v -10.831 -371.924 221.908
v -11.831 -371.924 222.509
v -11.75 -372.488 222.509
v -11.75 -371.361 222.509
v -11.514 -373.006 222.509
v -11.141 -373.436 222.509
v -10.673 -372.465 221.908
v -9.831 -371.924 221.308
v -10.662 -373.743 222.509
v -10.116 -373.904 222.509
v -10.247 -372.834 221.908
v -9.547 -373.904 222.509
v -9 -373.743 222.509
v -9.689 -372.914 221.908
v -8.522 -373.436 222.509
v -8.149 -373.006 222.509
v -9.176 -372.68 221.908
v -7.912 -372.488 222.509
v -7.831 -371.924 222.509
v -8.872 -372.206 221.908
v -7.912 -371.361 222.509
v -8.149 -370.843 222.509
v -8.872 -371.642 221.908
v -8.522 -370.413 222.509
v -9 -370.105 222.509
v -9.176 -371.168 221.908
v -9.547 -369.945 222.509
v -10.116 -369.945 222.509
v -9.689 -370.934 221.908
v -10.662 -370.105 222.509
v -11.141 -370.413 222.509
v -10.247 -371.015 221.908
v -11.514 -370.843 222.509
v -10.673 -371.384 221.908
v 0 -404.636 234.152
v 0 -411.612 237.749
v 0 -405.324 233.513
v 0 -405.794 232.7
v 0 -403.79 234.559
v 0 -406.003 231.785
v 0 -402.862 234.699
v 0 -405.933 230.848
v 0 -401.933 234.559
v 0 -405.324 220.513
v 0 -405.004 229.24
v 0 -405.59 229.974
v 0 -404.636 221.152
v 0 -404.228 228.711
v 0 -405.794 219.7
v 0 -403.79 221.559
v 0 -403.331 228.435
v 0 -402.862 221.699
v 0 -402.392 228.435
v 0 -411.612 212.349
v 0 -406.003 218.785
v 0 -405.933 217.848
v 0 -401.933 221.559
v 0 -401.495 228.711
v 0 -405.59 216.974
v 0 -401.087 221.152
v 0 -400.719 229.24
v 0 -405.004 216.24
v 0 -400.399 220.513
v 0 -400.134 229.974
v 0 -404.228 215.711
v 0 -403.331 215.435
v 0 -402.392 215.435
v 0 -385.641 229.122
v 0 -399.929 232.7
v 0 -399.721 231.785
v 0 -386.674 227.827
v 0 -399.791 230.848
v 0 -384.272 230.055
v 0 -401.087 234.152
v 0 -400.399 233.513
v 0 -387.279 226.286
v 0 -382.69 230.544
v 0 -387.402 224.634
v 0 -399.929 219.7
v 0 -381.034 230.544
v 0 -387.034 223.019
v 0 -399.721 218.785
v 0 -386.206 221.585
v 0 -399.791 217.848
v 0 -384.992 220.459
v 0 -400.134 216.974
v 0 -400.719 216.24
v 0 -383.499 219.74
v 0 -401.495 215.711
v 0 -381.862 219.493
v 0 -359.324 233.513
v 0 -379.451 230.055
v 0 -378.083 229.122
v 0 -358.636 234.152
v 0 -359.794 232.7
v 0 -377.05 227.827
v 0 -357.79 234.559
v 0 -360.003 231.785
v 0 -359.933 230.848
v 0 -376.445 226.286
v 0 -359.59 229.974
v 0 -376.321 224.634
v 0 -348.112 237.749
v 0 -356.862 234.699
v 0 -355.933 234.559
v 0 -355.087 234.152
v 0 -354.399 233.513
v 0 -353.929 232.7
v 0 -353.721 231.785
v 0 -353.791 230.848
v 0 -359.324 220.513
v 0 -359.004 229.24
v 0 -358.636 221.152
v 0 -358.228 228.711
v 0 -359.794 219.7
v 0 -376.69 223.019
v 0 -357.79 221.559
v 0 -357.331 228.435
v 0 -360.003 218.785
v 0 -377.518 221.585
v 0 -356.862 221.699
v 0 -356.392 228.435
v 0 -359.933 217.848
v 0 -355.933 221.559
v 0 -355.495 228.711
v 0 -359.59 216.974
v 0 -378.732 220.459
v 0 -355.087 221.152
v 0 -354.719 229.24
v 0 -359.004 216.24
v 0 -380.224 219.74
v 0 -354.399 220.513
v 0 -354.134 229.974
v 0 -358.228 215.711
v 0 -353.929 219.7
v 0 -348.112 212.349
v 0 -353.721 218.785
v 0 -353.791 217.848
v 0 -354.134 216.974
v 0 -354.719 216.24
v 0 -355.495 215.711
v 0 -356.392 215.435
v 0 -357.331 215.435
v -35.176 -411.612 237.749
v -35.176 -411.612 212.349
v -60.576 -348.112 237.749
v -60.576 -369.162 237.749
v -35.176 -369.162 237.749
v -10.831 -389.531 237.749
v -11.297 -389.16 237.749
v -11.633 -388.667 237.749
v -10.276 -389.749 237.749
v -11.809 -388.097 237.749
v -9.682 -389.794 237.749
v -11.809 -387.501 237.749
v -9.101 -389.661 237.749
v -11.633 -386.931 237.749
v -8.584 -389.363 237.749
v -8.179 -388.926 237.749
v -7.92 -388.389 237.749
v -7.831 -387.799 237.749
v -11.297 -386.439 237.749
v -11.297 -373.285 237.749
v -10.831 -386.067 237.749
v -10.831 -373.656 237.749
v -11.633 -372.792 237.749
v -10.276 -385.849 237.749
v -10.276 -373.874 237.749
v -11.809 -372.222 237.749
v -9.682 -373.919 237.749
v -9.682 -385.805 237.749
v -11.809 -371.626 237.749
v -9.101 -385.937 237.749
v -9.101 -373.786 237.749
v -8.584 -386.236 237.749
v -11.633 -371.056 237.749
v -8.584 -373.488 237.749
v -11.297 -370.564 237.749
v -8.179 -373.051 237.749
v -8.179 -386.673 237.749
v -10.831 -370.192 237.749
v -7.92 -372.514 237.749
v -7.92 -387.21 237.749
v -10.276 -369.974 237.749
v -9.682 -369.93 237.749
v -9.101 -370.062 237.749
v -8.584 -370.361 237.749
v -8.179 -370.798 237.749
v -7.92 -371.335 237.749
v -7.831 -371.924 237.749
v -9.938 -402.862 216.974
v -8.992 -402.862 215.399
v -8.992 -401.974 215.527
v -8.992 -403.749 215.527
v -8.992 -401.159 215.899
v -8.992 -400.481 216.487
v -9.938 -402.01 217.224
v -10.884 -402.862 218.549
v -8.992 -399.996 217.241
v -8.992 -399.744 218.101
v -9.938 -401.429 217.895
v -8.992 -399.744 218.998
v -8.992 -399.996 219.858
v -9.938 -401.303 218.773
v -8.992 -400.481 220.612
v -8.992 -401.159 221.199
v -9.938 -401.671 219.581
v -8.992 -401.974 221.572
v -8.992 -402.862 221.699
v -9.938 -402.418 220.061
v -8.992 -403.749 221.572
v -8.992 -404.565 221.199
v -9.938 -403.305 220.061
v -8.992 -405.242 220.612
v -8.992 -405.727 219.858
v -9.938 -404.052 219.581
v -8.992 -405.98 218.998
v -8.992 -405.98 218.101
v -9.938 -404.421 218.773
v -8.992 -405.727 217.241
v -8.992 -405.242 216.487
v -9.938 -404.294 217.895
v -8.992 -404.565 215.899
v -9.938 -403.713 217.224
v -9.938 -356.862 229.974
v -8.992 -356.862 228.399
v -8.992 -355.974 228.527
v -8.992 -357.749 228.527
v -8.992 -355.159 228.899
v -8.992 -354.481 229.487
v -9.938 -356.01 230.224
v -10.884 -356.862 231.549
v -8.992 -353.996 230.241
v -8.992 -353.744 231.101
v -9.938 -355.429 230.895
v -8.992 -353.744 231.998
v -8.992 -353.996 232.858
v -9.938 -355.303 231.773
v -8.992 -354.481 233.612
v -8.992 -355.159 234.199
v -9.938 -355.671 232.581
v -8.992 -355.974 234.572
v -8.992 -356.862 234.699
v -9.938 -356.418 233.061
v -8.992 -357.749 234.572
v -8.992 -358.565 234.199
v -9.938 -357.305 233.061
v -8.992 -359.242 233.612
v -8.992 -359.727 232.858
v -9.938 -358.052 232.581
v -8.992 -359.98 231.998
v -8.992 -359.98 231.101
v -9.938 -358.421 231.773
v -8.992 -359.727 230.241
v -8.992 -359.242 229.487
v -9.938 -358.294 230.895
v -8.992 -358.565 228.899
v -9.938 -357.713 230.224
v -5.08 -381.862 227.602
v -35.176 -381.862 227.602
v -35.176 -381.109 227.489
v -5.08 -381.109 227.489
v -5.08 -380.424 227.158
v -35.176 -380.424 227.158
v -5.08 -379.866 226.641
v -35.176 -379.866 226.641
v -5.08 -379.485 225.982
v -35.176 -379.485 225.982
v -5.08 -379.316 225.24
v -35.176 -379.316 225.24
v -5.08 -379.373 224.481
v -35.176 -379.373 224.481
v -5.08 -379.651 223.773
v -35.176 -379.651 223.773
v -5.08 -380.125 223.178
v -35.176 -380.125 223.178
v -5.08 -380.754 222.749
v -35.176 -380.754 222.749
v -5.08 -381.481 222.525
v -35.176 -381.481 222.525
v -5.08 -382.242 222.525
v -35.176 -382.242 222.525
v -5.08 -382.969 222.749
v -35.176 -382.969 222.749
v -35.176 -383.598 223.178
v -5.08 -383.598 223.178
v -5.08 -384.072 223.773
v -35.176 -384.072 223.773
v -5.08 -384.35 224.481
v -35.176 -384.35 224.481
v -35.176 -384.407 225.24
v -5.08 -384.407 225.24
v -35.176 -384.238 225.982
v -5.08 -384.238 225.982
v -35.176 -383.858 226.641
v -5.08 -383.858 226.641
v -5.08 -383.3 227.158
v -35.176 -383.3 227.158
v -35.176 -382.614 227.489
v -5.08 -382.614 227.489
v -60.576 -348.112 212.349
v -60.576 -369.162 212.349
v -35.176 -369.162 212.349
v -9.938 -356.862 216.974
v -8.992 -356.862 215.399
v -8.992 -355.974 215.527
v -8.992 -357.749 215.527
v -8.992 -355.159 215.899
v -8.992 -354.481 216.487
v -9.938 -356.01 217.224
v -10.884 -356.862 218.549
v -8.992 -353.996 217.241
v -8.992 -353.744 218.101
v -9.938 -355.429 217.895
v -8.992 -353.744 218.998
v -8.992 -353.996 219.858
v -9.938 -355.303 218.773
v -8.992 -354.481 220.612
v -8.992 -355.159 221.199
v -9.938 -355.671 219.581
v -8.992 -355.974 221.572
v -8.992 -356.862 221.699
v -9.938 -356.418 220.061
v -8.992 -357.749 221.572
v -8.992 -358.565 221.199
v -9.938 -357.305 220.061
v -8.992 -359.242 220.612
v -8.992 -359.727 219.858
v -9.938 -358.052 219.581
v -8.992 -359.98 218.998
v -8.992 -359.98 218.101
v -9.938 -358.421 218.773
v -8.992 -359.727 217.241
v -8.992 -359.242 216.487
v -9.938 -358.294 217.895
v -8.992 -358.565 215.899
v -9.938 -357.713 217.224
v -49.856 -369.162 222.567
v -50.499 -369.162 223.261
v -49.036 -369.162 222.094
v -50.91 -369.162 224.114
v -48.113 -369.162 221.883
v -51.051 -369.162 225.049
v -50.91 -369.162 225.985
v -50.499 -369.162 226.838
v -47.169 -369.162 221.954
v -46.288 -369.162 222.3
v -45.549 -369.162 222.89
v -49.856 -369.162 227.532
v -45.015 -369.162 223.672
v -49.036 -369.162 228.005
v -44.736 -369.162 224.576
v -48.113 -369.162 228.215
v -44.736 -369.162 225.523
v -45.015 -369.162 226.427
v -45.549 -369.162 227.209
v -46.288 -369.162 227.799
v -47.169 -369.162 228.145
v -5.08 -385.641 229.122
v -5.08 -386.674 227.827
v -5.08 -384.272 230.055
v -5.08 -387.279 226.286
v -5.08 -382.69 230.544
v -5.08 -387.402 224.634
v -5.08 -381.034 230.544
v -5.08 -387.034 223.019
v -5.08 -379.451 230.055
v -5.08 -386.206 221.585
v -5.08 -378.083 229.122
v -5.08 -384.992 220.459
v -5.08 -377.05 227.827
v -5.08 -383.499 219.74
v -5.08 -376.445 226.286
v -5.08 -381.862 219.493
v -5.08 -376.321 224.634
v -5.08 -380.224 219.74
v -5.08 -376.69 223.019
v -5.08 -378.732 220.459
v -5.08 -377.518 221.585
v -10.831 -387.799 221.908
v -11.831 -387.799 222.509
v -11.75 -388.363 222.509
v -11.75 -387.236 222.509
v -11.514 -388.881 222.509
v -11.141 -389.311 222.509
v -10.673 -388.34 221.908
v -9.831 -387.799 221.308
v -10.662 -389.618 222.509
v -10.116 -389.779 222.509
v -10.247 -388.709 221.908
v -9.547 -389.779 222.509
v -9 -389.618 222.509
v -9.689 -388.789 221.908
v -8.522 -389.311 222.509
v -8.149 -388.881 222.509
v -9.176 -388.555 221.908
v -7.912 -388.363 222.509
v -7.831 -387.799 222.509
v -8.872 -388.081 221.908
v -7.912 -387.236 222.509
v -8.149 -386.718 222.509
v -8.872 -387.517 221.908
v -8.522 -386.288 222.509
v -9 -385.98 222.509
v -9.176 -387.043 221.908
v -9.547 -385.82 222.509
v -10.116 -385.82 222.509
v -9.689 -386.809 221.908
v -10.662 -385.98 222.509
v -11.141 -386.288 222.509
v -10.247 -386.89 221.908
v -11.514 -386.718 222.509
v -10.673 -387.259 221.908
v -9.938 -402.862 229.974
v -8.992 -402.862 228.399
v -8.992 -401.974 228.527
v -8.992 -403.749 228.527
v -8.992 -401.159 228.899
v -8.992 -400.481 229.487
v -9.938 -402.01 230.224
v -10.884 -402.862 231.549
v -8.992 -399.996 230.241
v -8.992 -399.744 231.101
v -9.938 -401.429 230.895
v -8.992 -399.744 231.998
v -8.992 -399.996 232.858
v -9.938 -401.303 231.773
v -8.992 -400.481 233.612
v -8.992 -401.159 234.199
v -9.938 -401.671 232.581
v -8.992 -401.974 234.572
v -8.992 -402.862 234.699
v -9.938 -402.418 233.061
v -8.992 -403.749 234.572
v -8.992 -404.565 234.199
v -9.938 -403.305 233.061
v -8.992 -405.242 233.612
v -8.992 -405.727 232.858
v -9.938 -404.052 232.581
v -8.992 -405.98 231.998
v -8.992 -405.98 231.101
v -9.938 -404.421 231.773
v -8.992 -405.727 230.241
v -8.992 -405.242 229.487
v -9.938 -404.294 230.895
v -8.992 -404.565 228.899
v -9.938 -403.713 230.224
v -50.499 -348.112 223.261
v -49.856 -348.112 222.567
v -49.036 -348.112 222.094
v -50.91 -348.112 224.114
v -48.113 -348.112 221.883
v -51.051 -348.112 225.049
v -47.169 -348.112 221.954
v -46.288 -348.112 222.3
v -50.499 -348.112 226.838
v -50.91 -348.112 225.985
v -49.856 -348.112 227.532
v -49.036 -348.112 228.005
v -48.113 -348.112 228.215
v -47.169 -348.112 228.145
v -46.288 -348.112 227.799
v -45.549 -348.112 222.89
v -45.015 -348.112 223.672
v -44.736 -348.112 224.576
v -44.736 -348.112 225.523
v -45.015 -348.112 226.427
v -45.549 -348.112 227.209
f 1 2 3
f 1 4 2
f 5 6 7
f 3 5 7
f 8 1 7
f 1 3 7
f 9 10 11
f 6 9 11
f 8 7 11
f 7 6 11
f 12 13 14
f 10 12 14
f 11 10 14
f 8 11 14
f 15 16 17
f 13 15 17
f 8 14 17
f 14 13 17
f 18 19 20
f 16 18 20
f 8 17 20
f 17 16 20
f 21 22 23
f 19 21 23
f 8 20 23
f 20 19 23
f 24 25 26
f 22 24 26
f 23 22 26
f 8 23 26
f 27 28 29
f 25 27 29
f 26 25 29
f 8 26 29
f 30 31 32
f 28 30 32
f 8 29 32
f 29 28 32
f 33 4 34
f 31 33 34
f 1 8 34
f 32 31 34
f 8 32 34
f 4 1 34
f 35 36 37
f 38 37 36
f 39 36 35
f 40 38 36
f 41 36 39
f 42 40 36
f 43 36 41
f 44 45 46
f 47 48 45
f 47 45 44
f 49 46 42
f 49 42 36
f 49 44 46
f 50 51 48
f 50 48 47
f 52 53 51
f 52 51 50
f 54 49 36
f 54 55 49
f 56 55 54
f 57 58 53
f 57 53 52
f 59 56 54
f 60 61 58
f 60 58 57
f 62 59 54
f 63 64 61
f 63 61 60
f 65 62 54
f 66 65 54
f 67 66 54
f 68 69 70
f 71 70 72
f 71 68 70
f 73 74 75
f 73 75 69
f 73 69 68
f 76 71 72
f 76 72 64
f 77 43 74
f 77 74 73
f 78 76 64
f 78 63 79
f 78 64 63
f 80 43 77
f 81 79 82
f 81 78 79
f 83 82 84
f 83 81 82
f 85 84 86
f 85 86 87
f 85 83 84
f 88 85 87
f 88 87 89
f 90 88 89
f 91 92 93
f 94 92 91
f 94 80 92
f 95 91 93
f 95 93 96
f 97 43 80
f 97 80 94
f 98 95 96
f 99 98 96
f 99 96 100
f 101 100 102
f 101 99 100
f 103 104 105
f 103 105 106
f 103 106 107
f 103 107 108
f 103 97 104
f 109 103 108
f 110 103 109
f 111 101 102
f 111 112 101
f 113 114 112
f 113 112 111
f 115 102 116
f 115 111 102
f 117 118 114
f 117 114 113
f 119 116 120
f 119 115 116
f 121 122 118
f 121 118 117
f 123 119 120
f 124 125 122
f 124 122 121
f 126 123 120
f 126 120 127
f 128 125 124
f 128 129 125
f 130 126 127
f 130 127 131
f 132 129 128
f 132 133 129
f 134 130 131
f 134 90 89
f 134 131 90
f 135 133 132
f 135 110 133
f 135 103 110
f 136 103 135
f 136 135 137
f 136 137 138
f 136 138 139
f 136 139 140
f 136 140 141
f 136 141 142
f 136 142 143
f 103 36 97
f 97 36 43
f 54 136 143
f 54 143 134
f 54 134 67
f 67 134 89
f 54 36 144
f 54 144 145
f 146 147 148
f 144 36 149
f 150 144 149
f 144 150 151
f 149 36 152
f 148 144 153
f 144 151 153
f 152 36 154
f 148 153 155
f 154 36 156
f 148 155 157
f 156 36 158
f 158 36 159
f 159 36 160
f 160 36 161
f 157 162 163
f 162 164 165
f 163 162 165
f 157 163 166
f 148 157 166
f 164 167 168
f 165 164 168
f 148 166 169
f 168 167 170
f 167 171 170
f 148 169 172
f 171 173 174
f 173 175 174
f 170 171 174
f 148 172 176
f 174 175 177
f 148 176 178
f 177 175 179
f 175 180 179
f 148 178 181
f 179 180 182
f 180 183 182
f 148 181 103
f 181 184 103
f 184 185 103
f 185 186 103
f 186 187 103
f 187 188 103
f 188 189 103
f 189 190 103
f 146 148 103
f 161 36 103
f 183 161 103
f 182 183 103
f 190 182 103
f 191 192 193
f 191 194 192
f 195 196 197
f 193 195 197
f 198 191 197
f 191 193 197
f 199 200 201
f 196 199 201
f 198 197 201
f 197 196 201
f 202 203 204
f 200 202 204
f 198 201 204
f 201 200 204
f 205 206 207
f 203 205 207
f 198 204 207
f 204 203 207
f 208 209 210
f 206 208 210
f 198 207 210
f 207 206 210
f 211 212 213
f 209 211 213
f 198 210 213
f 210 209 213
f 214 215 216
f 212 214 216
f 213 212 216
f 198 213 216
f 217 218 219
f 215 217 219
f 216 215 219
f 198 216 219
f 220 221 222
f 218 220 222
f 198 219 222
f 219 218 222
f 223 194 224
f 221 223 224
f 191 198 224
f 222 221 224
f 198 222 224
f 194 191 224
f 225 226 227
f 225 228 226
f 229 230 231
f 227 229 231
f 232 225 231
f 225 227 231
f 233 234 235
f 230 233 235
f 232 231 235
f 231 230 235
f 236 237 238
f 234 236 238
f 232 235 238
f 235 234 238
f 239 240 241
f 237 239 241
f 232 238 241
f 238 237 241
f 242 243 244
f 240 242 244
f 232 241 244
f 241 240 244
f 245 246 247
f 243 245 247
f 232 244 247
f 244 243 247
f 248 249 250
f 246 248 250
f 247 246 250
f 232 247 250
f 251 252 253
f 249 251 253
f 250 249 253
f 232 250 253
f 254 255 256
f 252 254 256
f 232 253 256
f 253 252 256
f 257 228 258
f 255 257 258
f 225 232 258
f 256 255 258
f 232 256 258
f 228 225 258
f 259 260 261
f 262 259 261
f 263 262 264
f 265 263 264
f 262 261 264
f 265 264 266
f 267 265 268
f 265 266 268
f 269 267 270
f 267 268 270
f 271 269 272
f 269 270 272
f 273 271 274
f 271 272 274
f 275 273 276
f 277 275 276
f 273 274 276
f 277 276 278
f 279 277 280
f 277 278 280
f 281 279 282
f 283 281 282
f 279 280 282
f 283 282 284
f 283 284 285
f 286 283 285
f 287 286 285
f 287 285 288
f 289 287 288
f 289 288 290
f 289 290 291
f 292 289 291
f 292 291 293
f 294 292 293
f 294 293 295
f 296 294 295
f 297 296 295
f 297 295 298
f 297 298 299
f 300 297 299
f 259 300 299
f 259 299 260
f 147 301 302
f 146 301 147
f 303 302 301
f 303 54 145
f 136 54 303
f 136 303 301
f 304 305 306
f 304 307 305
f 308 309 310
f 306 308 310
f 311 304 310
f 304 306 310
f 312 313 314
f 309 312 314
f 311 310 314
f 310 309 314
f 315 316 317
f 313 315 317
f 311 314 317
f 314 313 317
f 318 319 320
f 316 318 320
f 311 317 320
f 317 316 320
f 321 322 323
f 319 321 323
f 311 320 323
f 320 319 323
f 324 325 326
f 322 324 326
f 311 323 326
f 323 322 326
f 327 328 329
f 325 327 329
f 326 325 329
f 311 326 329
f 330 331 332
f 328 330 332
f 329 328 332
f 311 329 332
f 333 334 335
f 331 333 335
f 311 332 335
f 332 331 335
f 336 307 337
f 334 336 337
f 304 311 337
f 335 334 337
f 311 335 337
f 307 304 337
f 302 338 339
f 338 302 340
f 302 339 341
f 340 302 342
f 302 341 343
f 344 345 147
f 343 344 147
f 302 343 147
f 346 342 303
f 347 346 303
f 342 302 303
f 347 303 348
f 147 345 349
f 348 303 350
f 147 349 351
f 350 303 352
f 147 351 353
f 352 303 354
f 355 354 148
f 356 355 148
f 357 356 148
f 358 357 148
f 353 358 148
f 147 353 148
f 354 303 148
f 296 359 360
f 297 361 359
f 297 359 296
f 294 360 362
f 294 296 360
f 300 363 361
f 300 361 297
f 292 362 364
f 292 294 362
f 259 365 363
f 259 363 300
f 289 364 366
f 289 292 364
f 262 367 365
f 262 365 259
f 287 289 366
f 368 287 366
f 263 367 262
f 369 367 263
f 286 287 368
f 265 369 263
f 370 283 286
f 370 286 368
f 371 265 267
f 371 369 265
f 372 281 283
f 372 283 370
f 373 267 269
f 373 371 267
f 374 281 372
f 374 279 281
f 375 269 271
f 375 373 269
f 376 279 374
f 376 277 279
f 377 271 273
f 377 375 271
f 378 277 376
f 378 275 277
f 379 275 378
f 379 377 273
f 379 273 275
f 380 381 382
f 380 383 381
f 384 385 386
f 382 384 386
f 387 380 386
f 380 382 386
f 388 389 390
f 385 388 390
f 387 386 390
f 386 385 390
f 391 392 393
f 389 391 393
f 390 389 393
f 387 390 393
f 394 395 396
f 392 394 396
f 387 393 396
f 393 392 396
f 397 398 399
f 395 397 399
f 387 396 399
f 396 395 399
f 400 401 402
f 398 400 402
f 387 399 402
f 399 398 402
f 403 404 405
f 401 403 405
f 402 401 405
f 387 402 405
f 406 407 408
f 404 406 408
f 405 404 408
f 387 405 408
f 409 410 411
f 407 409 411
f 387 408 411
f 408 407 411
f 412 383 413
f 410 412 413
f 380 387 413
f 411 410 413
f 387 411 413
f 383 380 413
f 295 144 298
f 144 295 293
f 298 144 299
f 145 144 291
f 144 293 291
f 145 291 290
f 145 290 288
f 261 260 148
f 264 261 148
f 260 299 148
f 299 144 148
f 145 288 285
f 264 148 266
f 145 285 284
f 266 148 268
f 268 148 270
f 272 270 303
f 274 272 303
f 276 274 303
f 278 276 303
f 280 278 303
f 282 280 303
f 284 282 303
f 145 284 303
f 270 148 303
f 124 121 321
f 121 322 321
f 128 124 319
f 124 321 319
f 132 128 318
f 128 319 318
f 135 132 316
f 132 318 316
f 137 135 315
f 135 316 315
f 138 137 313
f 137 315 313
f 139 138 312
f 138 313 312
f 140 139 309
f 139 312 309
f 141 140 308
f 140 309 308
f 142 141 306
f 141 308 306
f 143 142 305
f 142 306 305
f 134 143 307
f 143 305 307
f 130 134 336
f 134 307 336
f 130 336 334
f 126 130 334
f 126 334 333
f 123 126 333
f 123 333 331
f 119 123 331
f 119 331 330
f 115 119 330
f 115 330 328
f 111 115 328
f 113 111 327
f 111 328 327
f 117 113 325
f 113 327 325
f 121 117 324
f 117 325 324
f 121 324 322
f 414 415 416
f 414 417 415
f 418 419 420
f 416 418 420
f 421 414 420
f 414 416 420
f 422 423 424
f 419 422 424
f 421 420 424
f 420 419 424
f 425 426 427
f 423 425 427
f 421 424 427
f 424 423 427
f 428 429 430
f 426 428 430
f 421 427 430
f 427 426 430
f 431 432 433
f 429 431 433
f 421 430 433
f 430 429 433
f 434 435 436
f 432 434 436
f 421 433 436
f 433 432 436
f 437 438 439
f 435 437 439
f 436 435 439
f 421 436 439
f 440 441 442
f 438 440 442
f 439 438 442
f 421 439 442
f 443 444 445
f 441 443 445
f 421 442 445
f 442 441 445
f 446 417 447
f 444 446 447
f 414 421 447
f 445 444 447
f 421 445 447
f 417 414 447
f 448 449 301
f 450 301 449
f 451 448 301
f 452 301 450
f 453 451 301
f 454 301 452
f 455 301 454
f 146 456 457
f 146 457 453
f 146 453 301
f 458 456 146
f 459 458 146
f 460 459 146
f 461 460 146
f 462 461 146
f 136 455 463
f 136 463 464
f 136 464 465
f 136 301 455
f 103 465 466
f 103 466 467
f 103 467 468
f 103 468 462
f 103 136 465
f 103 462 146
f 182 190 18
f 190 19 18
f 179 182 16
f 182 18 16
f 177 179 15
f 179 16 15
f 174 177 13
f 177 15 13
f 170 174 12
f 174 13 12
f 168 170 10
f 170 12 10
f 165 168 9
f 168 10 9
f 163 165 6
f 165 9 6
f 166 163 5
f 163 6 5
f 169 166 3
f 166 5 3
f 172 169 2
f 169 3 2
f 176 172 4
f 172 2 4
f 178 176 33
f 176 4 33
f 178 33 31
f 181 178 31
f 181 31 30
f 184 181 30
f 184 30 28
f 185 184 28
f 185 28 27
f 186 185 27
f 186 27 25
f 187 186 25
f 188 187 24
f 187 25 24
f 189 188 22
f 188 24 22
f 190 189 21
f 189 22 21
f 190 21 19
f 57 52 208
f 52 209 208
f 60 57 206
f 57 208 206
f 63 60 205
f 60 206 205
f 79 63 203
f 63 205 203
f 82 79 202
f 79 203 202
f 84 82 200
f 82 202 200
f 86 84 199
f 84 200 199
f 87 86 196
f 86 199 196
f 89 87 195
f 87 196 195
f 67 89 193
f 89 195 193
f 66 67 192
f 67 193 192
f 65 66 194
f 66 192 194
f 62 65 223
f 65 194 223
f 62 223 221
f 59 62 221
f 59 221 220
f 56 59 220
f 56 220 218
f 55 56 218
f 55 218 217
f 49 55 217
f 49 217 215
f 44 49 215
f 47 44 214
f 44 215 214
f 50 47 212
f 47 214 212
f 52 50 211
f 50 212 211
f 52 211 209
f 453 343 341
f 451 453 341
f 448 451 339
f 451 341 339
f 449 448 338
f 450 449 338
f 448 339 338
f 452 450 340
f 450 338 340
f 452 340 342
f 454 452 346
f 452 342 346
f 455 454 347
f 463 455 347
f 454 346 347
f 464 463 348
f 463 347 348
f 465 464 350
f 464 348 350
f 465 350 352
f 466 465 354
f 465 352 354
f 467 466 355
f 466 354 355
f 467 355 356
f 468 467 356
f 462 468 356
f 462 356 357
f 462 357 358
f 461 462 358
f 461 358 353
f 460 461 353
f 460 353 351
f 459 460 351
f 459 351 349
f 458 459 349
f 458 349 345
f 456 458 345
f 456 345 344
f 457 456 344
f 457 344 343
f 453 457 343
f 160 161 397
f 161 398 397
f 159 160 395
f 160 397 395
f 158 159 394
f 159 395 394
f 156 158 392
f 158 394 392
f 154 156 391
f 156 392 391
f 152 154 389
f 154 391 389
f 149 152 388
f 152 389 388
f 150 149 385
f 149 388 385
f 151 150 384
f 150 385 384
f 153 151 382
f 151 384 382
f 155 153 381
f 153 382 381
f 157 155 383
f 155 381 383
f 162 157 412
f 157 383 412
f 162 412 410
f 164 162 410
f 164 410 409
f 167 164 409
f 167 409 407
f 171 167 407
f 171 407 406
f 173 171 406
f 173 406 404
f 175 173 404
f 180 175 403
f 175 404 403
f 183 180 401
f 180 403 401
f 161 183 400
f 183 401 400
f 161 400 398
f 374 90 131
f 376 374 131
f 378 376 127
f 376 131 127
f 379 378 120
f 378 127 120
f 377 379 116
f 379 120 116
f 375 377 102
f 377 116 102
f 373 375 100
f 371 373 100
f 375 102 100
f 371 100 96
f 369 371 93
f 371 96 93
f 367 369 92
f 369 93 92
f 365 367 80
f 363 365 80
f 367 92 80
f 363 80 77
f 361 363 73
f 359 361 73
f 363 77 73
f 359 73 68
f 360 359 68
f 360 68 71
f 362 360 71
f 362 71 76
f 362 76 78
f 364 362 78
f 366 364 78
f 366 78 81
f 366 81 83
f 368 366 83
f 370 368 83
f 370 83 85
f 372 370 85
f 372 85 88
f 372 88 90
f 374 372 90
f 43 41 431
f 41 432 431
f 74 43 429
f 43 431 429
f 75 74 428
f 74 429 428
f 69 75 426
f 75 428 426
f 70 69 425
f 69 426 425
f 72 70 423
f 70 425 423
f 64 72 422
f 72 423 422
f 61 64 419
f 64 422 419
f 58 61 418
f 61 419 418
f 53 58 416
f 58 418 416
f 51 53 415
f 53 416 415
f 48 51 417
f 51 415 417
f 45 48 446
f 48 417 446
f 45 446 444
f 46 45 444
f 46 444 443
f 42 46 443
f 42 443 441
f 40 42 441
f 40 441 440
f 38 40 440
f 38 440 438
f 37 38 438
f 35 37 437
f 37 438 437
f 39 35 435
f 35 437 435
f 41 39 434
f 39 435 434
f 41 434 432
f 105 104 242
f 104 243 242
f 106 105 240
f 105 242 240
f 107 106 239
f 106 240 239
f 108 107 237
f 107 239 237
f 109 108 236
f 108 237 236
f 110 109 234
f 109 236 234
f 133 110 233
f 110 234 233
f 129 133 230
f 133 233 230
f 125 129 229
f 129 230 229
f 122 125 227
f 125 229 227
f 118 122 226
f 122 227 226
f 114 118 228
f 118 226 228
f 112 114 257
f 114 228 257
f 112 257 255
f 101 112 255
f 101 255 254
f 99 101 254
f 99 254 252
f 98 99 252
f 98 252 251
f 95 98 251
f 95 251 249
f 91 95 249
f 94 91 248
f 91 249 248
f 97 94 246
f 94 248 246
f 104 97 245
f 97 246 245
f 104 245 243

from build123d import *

# Parameters (mm, degrees)
SKETCH2_W                                           = 25.4
SKETCH2_H                                           = 63.5
BOSS_EXTRUDE1_DEPTH                                 = 35.17596
SKETCH3_W                                           = 25.4
SKETCH3_H                                           = 21.05
BOSS_EXTRUDE2_DEPTH                                 = 25.4
F_1_4_0_25_DIAMETER_HOLE1_D                         = 6.35
F_1_0MM_DOWEL_HOLE1_D                               = 6.3
F_1_0MM_DOWEL_HOLE1_DEPTH                           = 8.9916
F_1_0MM_DOWEL_HOLE1_TIP                             = 1.89271095
F_4_0MM_DOWEL_HOLE1_D                               = 4
F_4_0MM_DOWEL_HOLE1_DEPTH                           = 15.24
F_4_0MM_DOWEL_HOLE1_TIP                             = 1.201721238
CBORE_FOR_10_BINDING_HEAD_MACHINE_SCREW_D           = 5.1054
CBORE_FOR_10_BINDING_HEAD_MACHINE_SCREW_DEPTH       = 35.17596
CBORE_FOR_10_BINDING_HEAD_MACHINE_SCREW_CBORE_D     = 11.1125
CBORE_FOR_10_BINDING_HEAD_MACHINE_SCREW_CBORE_DEPTH = 5.08


with BuildPart() as part:
    # Sketch2 → Boss-Extrude1 (new body)
    with BuildSketch(Plane(origin=(0, 0, 0), x_dir=(0, 0, -1), z_dir=(1, 0, 0))):
        with Locations((-225.049350785, -379.861725806)):
            Rectangle(SKETCH2_W, SKETCH2_H)
    extrude(amount=-BOSS_EXTRUDE1_DEPTH)

    # Sketch3 → Boss-Extrude2 (add)
    with BuildSketch(Plane.ZY.offset(35.17596)):
        with Locations((225.049350785, -358.636725806)):
            Rectangle(SKETCH3_W, SKETCH3_H)
    extrude(amount=BOSS_EXTRUDE2_DEPTH)

    # 1/4 (0.25) Diameter Hole1 (through all)
    with Locations(Plane(origin=(0, -348.111725806, 0), x_dir=(1, 0, 0), z_dir=(0, 1, 0))):
        with Locations((-47.87596, -225.049350785)):
            Hole(F_1_4_0_25_DIAMETER_HOLE1_D / 2)

    # Ø1.0mm Dowel Hole1
    with Locations(Plane(origin=(0, 0, 0), x_dir=(0, 0, -1), z_dir=(1, 0, 0))):
        with Locations((-231.549350785, -356.861725806), (-218.549350785, -356.861725806), (-231.549350785, -402.861725805), (-218.549350785, -402.861725805)):
            Hole(F_1_0MM_DOWEL_HOLE1_D / 2, depth=F_1_0MM_DOWEL_HOLE1_DEPTH)
            with Locations((0, 0, -(F_1_0MM_DOWEL_HOLE1_DEPTH + F_1_0MM_DOWEL_HOLE1_TIP / 2))):  # 118° drill point
                Cone(0, F_1_0MM_DOWEL_HOLE1_D / 2, F_1_0MM_DOWEL_HOLE1_TIP, mode=Mode.SUBTRACT)

    # Ø4.0mm Dowel Hole1
    with Locations(Plane(origin=(0, 0, 237.749350785), x_dir=(-1, 0, 0), z_dir=(0, 0, 1))):
        with Locations((9.83125001, 371.924225806), (9.83125001, 387.799225806)):
            Hole(F_4_0MM_DOWEL_HOLE1_D / 2, depth=F_4_0MM_DOWEL_HOLE1_DEPTH)
            with Locations((0, 0, -(F_4_0MM_DOWEL_HOLE1_DEPTH + F_4_0MM_DOWEL_HOLE1_TIP / 2))):  # 118° drill point
                Cone(0, F_4_0MM_DOWEL_HOLE1_D / 2, F_4_0MM_DOWEL_HOLE1_TIP, mode=Mode.SUBTRACT)

    # CBORE for #10 Binding Head Machine Screw1
    with Locations(Plane(origin=(0, 0, 0), x_dir=(0, 0, -1), z_dir=(1, 0, 0))):
        with Locations((-225.049350785, -381.861725806)):
            CounterBoreHole(CBORE_FOR_10_BINDING_HEAD_MACHINE_SCREW_D / 2, CBORE_FOR_10_BINDING_HEAD_MACHINE_SCREW_CBORE_D / 2, CBORE_FOR_10_BINDING_HEAD_MACHINE_SCREW_CBORE_DEPTH, depth=CBORE_FOR_10_BINDING_HEAD_MACHINE_SCREW_DEPTH)


solid = part.part
